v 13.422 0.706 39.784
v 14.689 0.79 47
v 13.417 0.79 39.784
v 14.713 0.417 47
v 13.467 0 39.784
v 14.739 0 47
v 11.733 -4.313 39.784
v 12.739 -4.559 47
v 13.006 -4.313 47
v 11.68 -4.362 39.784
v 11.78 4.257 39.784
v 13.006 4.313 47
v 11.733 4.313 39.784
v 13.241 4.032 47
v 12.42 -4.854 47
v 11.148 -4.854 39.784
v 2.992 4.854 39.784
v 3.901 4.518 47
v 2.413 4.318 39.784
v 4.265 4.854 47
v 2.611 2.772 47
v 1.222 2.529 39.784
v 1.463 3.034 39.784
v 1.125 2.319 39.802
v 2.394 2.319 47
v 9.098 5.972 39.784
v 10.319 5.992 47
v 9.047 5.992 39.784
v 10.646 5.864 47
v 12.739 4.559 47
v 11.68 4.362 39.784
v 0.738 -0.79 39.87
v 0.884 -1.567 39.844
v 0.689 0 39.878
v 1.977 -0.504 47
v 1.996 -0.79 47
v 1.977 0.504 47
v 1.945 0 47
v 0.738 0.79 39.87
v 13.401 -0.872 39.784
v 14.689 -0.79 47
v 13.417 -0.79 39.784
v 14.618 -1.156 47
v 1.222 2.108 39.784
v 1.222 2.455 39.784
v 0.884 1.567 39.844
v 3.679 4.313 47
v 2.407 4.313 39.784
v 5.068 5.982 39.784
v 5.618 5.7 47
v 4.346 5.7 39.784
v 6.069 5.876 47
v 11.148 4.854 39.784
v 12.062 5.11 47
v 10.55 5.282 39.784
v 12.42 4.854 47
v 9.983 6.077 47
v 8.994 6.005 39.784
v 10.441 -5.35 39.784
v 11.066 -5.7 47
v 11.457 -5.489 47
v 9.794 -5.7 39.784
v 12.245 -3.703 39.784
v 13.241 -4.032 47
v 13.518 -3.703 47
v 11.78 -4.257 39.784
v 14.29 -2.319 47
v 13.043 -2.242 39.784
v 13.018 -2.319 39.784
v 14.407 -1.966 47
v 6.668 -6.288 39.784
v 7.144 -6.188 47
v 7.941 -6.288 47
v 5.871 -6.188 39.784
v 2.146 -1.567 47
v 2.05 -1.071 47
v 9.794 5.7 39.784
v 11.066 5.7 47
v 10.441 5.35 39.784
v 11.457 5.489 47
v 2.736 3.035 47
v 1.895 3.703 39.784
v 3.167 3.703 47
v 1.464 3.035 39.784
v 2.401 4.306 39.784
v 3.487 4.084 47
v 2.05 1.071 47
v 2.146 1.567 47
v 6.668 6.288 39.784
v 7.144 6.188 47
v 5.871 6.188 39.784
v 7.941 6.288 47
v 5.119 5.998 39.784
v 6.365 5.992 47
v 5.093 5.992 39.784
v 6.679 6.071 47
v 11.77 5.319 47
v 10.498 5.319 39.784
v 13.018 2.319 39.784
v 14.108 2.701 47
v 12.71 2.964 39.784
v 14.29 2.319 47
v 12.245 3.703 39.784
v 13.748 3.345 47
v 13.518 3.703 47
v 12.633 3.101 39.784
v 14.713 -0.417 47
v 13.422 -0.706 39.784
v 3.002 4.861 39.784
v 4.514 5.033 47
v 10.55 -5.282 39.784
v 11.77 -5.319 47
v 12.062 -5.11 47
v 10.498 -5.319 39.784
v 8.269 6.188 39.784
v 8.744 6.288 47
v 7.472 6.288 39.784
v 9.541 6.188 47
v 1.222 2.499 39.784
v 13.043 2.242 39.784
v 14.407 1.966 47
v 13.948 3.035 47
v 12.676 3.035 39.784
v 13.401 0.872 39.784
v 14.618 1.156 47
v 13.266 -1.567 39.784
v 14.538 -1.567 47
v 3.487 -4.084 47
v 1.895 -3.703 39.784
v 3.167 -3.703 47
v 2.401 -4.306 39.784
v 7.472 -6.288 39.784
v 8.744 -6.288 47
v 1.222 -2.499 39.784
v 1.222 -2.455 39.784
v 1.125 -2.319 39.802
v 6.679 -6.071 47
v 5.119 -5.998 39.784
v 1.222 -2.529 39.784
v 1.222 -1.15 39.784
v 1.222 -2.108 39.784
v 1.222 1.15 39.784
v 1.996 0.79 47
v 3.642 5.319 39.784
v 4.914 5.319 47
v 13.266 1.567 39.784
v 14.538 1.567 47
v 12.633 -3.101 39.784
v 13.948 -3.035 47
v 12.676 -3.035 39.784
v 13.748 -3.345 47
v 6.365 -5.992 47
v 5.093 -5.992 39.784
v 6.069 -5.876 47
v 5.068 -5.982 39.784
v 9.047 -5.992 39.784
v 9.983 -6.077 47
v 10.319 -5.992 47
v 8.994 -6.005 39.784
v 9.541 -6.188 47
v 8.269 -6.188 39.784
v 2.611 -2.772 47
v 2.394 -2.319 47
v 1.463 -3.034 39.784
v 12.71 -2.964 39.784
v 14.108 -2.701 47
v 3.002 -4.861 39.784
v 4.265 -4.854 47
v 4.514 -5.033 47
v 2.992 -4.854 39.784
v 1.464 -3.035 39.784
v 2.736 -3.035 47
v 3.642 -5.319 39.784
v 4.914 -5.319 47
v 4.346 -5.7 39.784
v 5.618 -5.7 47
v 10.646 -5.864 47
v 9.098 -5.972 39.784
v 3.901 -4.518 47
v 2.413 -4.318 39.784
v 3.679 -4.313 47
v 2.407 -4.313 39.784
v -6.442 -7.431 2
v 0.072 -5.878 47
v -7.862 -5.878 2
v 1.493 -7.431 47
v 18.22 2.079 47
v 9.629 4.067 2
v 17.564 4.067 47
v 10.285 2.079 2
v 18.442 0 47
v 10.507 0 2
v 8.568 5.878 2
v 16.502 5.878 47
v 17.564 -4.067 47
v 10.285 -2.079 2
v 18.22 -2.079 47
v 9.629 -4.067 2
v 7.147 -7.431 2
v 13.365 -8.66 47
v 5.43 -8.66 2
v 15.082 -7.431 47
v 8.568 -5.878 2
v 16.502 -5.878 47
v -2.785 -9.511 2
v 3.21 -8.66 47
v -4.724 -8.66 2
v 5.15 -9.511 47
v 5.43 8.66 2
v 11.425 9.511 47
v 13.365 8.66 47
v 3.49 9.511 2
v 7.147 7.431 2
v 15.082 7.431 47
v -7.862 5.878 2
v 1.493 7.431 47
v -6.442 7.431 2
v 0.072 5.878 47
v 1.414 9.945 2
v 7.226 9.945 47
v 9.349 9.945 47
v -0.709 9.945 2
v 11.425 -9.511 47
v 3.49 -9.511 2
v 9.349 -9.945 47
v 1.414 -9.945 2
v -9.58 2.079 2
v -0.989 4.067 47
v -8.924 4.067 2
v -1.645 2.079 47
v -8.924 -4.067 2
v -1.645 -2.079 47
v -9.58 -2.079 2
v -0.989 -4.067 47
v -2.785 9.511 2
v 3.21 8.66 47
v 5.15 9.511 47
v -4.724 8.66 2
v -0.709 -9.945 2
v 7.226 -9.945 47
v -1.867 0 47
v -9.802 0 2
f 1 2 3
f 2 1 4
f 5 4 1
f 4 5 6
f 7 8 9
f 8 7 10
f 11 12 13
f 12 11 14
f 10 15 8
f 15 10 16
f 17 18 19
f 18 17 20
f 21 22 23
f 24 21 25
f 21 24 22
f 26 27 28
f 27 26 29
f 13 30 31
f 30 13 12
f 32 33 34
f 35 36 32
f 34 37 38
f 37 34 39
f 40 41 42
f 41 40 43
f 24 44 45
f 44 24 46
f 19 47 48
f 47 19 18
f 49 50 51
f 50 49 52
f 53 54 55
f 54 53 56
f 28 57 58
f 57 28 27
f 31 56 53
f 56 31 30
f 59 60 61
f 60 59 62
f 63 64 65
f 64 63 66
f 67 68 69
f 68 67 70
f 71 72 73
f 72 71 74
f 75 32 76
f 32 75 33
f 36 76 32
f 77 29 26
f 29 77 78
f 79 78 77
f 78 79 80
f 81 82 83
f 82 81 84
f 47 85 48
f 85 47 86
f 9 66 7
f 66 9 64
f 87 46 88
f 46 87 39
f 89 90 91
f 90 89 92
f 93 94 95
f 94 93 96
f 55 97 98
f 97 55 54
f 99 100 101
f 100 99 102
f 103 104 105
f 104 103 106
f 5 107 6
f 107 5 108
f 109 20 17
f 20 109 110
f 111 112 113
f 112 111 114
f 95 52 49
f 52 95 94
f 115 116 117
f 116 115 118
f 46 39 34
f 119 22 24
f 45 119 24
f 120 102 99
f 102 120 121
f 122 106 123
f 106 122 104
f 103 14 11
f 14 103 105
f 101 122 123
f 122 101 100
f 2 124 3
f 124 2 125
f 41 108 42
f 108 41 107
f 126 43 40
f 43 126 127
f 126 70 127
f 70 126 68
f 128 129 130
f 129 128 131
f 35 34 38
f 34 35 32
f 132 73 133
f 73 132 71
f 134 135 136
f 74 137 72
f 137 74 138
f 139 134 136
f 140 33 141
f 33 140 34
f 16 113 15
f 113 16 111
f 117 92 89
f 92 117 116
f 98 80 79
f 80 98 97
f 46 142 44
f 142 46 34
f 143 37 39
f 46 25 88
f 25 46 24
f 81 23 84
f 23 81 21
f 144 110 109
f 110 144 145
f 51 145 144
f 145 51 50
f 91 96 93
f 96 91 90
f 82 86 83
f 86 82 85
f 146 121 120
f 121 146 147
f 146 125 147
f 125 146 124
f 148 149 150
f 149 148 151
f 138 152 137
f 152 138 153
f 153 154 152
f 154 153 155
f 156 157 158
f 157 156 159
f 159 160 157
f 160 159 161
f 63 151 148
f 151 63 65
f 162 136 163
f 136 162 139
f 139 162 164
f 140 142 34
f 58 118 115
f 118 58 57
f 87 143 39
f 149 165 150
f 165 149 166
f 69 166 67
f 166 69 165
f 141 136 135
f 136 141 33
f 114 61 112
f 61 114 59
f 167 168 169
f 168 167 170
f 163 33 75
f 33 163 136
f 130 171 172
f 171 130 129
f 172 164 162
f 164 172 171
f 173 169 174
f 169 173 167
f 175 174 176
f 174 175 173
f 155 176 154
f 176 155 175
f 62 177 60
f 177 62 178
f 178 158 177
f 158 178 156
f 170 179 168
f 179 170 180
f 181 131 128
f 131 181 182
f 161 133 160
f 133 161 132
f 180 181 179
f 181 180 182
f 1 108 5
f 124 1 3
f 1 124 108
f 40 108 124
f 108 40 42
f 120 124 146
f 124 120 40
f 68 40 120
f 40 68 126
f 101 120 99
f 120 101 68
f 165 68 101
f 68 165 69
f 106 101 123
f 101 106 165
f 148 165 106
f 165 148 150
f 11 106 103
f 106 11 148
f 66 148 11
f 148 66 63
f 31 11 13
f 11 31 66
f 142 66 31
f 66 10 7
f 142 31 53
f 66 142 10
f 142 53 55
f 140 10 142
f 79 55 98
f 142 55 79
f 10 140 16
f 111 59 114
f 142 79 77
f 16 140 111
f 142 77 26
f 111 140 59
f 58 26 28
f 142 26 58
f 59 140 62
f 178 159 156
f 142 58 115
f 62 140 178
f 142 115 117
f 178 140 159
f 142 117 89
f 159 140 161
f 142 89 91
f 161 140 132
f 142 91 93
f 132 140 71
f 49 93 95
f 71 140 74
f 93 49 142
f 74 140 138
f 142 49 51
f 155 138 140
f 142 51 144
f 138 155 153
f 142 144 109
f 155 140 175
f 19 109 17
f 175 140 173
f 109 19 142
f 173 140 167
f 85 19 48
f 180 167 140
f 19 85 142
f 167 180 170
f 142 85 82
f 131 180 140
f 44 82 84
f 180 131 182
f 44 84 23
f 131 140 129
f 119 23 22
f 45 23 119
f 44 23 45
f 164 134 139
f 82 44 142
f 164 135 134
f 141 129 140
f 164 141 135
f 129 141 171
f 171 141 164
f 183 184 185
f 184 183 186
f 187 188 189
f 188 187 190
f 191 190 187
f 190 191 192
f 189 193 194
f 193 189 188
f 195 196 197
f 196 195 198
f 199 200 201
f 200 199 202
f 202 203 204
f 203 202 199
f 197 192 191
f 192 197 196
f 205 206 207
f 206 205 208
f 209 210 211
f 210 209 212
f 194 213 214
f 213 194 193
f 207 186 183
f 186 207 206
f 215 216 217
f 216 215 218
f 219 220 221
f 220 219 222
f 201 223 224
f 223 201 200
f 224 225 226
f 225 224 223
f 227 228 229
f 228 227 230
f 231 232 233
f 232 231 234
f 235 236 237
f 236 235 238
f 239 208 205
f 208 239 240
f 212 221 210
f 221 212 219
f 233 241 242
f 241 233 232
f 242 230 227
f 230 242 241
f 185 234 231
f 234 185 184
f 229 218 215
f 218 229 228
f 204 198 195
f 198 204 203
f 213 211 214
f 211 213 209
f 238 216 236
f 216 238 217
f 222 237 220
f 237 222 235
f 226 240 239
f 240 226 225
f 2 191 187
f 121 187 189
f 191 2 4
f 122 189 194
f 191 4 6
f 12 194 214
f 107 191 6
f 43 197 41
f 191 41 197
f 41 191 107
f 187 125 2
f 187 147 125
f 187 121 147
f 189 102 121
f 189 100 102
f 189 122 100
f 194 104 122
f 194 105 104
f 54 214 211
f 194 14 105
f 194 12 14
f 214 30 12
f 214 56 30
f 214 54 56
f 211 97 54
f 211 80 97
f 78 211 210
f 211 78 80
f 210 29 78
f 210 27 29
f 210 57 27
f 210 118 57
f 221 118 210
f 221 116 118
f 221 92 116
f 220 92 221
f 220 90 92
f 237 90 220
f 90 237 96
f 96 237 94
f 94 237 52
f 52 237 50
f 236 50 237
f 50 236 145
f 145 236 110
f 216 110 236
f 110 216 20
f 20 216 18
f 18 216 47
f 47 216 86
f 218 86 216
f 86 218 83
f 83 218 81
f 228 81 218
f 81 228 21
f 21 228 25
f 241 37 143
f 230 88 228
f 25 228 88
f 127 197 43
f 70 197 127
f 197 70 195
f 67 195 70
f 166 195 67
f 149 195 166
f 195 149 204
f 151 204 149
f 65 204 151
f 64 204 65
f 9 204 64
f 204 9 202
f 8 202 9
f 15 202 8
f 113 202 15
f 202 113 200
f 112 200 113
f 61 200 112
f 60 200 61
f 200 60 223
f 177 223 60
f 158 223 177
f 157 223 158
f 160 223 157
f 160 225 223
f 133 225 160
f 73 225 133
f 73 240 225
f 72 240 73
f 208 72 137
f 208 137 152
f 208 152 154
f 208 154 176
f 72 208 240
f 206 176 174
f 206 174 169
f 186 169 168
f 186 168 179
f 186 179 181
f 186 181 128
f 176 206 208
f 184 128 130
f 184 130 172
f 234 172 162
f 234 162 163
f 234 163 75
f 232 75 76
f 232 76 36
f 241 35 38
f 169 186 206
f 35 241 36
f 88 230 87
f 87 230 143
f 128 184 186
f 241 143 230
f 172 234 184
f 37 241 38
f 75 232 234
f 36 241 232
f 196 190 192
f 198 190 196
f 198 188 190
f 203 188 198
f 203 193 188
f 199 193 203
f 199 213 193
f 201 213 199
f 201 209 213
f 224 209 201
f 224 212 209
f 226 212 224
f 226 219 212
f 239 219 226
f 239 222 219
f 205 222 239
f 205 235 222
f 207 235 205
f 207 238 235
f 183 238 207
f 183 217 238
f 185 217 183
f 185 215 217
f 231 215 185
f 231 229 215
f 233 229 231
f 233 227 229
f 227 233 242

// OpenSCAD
*mirror([0,0,1]) {
translate([0,0,50]) difference(){
  cylinder(d=170,h=10,$fn=300);
  translate([0,0,-.01]) cylinder(d1=140,d2=150,h=10.02,$fn=300);
}
for(r=[0:60:360]) rotate([0,0,r]) translate([78,-4,52]) intersection(){
  mirror([0,0,1]) rotate([0,10]) cylinder(d=12,h=55,$fn=50);
  translate([-10,-10,-50]) cube([30,20,50]);
}
}
intersection(){
  translate([-10,-10,2]) cube([30,30,45]);
  rotate([0,10]) difference(){
  cylinder(d=20,h=50);
  translate([7,0]) rotate([0,-10]) translate([0,0,40]) intersection() {
    rotate([0,10]) cylinder(d=12.6,h=20,$fn=50);
    translate([-8,-8,1]) cube([24,24,20]);
  }
}
}
